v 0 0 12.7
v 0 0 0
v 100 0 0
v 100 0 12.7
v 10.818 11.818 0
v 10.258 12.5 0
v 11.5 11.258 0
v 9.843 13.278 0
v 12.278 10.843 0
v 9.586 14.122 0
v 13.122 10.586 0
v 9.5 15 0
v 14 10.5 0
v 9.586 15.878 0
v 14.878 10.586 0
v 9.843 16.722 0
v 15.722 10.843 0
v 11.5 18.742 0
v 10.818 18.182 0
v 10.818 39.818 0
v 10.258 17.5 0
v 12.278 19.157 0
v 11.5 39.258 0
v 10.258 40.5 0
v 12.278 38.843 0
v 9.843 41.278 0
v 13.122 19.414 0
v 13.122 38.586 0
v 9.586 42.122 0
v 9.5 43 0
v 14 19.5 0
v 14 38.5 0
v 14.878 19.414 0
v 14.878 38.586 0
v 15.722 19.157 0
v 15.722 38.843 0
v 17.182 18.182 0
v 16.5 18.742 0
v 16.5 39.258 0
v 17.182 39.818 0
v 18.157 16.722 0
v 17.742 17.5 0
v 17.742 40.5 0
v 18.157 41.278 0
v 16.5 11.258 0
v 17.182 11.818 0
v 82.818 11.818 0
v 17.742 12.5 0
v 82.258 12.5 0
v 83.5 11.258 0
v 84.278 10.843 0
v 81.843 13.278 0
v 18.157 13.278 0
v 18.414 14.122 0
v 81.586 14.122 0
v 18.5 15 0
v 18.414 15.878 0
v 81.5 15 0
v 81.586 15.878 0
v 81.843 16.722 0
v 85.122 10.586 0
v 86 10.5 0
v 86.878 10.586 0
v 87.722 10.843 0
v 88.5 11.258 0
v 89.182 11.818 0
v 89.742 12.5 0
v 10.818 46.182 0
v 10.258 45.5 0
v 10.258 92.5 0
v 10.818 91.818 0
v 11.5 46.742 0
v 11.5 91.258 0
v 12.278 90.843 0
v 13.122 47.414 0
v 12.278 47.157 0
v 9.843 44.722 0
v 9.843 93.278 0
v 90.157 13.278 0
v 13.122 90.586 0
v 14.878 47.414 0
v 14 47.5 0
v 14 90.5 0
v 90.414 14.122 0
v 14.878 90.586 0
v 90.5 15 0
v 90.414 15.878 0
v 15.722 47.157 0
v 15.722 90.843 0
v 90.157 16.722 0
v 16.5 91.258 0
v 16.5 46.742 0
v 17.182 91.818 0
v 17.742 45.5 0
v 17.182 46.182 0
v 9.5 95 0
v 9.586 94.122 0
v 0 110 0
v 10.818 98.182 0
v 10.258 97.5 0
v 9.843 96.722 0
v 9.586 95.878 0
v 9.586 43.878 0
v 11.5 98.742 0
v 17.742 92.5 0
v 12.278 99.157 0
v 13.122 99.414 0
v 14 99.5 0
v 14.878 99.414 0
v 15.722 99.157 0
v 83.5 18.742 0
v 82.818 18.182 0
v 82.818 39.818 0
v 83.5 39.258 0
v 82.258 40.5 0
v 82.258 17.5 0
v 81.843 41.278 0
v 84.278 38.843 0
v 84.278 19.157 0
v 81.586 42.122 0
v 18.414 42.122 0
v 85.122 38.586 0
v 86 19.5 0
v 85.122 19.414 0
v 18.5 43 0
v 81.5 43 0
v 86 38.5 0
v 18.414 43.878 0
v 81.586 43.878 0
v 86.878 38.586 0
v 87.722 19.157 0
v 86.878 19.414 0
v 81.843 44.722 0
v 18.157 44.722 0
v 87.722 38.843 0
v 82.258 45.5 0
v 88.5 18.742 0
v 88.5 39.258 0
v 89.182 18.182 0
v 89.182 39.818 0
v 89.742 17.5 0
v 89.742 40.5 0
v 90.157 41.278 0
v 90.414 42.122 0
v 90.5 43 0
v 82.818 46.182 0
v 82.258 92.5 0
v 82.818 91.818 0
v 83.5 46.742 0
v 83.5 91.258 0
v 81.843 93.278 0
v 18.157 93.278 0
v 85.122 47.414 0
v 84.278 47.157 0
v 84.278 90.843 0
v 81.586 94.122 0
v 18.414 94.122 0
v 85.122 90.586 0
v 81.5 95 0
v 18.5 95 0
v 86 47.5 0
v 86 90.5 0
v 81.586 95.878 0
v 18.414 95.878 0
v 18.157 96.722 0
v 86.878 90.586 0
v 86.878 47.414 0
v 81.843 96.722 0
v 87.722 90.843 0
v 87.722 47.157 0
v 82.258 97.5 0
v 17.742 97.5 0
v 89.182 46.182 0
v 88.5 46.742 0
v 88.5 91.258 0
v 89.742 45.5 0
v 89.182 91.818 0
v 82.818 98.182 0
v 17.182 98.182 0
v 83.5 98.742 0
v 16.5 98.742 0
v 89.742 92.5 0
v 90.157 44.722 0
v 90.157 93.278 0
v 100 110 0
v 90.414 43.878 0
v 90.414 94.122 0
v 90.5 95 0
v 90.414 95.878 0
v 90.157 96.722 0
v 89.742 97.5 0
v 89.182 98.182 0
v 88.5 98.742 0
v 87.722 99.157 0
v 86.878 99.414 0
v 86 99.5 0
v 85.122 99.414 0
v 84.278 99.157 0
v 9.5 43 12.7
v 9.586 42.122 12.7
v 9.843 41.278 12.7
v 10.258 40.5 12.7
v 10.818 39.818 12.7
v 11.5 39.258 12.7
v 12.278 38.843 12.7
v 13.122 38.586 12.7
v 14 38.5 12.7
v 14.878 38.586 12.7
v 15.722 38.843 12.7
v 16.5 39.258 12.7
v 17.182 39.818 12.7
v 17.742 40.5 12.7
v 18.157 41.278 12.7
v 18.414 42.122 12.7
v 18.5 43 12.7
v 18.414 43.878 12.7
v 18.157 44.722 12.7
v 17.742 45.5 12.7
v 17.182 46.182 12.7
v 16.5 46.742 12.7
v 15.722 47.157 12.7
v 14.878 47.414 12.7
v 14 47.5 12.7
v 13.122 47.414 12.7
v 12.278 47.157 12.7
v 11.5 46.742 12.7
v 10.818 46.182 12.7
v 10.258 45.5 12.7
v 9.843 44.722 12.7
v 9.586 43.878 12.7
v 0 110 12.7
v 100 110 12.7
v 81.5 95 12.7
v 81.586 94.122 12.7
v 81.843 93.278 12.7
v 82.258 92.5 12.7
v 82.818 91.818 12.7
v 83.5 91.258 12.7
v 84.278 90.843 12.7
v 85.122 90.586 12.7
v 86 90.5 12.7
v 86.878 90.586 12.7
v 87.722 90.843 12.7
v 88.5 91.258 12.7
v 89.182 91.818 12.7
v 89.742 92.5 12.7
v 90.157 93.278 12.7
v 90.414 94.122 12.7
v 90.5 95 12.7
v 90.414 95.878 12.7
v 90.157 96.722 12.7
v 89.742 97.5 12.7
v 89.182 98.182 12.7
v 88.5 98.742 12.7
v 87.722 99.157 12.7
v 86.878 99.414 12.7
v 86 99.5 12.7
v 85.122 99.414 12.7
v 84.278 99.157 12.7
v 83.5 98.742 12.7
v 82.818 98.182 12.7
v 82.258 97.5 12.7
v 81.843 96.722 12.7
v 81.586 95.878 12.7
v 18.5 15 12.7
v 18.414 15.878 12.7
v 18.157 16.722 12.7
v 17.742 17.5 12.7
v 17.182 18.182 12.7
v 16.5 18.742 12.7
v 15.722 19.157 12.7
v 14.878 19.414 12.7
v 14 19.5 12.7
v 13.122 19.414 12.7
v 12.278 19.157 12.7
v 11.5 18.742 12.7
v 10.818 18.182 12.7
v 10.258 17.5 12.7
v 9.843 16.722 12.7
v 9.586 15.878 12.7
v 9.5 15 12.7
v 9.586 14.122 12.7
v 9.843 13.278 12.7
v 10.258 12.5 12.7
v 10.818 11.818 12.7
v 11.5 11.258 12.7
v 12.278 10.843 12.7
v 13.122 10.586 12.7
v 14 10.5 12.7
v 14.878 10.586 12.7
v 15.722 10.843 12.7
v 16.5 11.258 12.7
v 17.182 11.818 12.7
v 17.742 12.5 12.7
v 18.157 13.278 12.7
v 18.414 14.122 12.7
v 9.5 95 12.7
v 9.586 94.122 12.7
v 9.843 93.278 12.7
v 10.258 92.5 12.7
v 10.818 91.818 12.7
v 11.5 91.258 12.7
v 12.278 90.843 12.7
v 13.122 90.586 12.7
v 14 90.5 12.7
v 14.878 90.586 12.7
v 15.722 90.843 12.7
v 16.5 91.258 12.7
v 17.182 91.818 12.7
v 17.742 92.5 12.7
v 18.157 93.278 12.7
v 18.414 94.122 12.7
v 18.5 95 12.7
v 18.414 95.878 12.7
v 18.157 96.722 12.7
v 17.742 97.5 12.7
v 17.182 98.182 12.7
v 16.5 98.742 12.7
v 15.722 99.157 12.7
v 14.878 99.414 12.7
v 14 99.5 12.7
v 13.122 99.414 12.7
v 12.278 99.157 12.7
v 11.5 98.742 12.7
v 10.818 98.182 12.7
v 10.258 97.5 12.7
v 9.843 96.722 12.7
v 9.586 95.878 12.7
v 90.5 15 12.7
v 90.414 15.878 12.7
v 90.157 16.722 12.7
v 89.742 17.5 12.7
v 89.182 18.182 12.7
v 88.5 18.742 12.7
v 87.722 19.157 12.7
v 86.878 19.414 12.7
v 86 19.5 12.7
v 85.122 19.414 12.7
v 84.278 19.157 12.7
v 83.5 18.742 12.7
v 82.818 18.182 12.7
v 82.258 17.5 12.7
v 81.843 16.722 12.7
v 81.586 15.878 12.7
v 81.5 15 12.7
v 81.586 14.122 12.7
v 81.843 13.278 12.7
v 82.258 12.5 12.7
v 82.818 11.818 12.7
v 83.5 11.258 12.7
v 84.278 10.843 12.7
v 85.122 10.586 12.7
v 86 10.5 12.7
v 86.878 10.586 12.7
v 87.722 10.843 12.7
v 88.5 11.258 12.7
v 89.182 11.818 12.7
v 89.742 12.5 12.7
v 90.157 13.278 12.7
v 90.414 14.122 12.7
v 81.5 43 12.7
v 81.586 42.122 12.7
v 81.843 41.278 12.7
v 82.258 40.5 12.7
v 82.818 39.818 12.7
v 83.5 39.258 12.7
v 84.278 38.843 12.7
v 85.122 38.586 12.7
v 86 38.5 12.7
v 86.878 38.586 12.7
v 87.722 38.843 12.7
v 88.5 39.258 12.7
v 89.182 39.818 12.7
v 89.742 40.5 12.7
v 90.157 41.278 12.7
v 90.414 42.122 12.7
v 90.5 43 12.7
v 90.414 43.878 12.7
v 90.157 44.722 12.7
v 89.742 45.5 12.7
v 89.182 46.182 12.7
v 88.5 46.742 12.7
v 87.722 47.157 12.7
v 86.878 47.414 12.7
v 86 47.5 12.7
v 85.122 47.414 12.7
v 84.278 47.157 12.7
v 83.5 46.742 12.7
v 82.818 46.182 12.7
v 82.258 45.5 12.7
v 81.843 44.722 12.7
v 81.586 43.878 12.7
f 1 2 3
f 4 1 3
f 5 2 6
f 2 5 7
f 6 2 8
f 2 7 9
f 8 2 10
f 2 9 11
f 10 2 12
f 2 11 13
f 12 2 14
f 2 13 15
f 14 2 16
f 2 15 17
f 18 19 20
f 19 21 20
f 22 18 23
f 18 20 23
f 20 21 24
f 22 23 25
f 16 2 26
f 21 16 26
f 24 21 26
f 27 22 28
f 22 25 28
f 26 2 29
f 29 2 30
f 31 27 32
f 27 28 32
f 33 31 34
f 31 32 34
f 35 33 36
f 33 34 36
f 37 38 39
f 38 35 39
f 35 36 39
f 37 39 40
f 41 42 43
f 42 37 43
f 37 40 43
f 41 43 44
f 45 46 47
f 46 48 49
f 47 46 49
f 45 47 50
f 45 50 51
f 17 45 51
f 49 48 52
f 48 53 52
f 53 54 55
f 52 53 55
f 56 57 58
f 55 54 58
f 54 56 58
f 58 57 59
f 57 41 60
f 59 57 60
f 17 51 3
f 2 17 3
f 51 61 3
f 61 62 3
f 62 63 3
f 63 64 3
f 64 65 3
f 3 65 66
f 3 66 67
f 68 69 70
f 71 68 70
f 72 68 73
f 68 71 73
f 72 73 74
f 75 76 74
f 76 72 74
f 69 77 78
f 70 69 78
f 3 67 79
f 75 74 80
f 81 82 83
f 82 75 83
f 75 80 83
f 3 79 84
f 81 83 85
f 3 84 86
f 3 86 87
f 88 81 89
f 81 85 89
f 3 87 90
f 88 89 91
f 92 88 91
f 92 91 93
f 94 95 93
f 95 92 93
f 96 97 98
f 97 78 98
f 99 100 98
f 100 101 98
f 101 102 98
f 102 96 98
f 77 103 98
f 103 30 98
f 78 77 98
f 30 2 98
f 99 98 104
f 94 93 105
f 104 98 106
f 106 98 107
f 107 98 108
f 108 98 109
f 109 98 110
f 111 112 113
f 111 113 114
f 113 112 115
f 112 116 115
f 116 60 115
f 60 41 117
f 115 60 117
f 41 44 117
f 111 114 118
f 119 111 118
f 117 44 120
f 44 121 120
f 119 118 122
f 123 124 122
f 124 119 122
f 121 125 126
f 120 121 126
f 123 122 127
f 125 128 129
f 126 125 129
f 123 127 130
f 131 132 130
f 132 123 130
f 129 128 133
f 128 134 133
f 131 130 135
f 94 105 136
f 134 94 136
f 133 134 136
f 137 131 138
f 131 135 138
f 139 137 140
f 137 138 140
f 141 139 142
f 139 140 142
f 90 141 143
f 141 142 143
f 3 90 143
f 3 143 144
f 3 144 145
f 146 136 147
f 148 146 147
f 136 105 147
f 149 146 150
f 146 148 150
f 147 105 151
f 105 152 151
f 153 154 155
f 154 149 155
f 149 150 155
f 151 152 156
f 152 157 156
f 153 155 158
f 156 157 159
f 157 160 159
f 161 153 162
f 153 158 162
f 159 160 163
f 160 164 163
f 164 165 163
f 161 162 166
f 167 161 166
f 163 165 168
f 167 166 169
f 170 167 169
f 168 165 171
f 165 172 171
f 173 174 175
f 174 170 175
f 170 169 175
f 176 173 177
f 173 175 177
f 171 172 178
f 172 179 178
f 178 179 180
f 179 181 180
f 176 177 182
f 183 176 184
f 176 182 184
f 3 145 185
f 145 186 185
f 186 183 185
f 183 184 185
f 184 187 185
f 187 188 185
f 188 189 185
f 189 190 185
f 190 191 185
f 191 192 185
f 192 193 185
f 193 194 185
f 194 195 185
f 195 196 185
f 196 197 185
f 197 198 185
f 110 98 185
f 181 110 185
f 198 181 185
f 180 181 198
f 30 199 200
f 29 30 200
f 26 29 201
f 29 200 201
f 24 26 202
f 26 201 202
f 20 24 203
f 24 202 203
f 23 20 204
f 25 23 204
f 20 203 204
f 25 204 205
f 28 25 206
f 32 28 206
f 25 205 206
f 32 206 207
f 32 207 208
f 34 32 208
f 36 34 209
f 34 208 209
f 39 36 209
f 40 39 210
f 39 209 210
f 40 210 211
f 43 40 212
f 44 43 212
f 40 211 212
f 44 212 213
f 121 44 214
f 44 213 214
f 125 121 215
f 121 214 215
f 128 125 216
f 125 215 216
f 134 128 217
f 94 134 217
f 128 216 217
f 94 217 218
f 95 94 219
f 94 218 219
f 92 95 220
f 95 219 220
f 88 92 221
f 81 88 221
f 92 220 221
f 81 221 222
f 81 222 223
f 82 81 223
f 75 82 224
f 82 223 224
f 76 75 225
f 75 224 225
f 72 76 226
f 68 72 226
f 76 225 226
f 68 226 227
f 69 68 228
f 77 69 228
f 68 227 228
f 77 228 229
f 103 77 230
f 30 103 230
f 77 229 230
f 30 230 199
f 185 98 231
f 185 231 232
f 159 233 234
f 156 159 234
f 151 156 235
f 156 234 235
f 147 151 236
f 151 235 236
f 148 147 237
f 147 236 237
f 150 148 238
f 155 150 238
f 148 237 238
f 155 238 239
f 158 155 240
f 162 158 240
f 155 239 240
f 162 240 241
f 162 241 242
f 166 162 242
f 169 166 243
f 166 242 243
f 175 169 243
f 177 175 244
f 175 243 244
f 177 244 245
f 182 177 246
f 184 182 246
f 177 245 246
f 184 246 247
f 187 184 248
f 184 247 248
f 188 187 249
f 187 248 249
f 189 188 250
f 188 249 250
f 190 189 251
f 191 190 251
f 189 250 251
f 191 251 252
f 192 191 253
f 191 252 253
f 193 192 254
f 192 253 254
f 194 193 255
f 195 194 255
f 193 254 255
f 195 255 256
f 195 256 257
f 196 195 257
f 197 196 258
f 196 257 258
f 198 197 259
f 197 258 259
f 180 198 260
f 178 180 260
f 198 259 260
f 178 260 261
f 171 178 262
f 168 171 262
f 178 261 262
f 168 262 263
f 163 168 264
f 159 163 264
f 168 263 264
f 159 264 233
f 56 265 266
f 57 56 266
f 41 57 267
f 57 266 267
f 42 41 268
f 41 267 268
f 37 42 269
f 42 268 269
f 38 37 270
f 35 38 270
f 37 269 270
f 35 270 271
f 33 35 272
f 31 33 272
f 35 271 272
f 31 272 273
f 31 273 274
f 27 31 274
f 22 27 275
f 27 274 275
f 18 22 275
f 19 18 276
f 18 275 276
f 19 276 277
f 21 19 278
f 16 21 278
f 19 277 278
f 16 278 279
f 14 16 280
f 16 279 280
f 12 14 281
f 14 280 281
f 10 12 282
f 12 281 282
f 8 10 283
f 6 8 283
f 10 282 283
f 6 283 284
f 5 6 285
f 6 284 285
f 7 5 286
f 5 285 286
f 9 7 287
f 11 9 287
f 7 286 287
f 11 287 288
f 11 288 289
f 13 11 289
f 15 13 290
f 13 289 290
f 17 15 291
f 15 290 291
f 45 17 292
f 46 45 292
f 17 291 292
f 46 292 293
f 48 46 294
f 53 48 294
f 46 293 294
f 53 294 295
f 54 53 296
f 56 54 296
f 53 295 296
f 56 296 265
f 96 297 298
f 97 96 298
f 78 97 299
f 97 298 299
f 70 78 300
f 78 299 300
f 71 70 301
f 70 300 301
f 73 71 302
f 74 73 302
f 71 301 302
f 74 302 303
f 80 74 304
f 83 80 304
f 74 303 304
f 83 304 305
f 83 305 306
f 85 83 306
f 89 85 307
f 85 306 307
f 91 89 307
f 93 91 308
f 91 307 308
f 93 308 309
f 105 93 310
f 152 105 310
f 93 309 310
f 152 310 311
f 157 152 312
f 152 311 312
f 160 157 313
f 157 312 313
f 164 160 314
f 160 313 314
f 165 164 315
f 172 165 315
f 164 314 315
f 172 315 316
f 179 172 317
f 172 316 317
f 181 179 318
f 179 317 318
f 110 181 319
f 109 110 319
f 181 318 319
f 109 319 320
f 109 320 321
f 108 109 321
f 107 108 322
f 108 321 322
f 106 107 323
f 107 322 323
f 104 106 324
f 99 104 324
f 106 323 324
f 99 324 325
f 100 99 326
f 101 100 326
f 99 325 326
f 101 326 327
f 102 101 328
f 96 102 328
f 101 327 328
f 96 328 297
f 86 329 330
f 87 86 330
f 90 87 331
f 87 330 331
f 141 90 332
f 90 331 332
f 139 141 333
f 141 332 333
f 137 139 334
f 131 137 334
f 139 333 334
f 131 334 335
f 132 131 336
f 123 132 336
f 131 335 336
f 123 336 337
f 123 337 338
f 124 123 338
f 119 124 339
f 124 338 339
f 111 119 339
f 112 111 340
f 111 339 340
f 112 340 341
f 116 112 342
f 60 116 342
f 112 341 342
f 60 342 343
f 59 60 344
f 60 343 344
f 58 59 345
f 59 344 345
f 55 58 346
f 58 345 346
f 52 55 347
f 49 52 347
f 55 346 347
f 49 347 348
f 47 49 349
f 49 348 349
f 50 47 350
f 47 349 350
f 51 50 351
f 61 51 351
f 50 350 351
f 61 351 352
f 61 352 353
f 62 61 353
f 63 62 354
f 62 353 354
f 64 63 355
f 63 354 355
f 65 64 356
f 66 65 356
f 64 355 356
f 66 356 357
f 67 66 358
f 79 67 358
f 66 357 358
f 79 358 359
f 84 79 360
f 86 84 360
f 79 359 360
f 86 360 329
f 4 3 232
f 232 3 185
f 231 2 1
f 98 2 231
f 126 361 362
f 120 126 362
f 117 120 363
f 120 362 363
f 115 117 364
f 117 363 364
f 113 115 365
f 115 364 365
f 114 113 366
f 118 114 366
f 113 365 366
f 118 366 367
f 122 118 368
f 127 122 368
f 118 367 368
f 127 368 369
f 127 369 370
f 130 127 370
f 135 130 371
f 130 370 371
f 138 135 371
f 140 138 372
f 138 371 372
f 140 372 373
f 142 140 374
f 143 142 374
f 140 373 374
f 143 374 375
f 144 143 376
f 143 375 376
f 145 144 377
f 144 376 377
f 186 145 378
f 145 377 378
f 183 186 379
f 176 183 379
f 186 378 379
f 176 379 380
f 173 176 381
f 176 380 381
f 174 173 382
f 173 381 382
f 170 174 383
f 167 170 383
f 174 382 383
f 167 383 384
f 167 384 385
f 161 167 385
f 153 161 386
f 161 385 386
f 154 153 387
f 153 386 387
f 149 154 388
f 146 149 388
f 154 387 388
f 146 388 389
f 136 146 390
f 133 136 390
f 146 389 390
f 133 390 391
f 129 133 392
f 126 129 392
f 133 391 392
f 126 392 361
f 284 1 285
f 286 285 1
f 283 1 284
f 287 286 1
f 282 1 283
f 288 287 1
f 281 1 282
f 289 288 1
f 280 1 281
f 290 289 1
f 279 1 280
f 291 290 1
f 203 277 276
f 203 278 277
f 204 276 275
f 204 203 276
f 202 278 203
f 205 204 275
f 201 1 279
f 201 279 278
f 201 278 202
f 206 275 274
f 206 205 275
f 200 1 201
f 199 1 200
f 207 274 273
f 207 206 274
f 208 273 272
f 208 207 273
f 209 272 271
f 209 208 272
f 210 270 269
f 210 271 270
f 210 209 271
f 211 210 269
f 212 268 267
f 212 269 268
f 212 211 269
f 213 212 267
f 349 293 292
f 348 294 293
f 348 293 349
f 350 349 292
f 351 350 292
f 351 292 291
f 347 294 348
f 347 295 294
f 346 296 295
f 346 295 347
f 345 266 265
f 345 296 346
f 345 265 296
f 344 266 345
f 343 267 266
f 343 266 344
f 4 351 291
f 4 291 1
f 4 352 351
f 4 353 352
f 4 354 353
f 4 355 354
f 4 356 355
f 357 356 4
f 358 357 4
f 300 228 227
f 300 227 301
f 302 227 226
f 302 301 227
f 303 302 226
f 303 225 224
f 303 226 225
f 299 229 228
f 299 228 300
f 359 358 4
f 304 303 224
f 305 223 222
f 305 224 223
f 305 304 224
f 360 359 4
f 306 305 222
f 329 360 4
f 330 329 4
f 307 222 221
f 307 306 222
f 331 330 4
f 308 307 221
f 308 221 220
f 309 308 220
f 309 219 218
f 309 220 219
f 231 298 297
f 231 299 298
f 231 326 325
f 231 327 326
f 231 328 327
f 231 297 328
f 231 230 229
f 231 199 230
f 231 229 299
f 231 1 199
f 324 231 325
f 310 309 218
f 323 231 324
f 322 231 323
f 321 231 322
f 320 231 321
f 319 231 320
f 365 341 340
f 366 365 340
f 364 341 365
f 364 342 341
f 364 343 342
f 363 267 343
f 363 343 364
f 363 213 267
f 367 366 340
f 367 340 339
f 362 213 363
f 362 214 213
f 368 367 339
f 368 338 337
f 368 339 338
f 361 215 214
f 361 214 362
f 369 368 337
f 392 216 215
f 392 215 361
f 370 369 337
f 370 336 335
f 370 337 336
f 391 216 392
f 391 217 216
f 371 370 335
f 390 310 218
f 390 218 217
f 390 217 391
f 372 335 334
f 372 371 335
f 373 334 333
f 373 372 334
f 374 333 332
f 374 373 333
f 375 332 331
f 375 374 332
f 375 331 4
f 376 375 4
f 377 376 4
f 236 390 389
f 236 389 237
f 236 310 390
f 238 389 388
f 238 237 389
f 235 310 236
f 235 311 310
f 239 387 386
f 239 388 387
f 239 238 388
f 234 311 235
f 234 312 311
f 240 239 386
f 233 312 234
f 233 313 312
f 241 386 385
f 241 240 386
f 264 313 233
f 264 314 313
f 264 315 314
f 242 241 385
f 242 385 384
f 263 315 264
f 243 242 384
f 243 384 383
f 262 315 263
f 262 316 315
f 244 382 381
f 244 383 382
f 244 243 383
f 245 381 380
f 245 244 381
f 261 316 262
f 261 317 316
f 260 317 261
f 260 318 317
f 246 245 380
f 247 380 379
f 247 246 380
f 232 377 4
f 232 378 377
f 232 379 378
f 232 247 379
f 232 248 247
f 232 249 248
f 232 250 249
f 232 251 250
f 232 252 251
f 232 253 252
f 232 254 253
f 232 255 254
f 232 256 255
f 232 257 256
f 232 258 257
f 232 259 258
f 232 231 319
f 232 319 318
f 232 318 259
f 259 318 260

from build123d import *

# Parameters (mm, degrees)
SKETCH1_W           = 100
SKETCH1_H           = 110
BOSS_EXTRUDE1_DEPTH = 12.7
SKETCH2_R           = 4.5
CUT_EXTRUDE1_DEPTH  = 12.7


with BuildPart() as part:
    # Sketch1 → Boss-Extrude1 (new body)
    with BuildSketch(Plane.XY):
        with Locations((50, 55)):
            Rectangle(SKETCH1_W, SKETCH1_H)
    extrude(amount=BOSS_EXTRUDE1_DEPTH)

    # Sketch2 → Cut-Extrude1 (cut)
    with BuildSketch(Plane.XY.offset(12.7)):
        with Locations((86, 15)):
            Circle(SKETCH2_R)
        with Locations((14, 15)):
            Circle(SKETCH2_R)
        with BuildLine():
            ThreePointArc((18.5, 43), (14, 47.5), (9.5, 43))
            ThreePointArc((9.5, 43), (14, 38.5), (18.5, 43))
        make_face()
        with BuildLine():
            ThreePointArc((18.5, 95), (14, 99.5), (9.5, 95))
            ThreePointArc((9.5, 95), (14, 90.5), (18.5, 95))
        make_face()
        with BuildLine():
            ThreePointArc((90.5, 43), (86, 47.5), (81.5, 43))
            ThreePointArc((81.5, 43), (86, 38.5), (90.5, 43))
        make_face()
        with BuildLine():
            ThreePointArc((90.5, 95), (86, 99.5), (81.5, 95))
            ThreePointArc((81.5, 95), (86, 90.5), (90.5, 95))
        make_face()
    extrude(amount=-CUT_EXTRUDE1_DEPTH, mode=Mode.SUBTRACT)


solid = part.part
